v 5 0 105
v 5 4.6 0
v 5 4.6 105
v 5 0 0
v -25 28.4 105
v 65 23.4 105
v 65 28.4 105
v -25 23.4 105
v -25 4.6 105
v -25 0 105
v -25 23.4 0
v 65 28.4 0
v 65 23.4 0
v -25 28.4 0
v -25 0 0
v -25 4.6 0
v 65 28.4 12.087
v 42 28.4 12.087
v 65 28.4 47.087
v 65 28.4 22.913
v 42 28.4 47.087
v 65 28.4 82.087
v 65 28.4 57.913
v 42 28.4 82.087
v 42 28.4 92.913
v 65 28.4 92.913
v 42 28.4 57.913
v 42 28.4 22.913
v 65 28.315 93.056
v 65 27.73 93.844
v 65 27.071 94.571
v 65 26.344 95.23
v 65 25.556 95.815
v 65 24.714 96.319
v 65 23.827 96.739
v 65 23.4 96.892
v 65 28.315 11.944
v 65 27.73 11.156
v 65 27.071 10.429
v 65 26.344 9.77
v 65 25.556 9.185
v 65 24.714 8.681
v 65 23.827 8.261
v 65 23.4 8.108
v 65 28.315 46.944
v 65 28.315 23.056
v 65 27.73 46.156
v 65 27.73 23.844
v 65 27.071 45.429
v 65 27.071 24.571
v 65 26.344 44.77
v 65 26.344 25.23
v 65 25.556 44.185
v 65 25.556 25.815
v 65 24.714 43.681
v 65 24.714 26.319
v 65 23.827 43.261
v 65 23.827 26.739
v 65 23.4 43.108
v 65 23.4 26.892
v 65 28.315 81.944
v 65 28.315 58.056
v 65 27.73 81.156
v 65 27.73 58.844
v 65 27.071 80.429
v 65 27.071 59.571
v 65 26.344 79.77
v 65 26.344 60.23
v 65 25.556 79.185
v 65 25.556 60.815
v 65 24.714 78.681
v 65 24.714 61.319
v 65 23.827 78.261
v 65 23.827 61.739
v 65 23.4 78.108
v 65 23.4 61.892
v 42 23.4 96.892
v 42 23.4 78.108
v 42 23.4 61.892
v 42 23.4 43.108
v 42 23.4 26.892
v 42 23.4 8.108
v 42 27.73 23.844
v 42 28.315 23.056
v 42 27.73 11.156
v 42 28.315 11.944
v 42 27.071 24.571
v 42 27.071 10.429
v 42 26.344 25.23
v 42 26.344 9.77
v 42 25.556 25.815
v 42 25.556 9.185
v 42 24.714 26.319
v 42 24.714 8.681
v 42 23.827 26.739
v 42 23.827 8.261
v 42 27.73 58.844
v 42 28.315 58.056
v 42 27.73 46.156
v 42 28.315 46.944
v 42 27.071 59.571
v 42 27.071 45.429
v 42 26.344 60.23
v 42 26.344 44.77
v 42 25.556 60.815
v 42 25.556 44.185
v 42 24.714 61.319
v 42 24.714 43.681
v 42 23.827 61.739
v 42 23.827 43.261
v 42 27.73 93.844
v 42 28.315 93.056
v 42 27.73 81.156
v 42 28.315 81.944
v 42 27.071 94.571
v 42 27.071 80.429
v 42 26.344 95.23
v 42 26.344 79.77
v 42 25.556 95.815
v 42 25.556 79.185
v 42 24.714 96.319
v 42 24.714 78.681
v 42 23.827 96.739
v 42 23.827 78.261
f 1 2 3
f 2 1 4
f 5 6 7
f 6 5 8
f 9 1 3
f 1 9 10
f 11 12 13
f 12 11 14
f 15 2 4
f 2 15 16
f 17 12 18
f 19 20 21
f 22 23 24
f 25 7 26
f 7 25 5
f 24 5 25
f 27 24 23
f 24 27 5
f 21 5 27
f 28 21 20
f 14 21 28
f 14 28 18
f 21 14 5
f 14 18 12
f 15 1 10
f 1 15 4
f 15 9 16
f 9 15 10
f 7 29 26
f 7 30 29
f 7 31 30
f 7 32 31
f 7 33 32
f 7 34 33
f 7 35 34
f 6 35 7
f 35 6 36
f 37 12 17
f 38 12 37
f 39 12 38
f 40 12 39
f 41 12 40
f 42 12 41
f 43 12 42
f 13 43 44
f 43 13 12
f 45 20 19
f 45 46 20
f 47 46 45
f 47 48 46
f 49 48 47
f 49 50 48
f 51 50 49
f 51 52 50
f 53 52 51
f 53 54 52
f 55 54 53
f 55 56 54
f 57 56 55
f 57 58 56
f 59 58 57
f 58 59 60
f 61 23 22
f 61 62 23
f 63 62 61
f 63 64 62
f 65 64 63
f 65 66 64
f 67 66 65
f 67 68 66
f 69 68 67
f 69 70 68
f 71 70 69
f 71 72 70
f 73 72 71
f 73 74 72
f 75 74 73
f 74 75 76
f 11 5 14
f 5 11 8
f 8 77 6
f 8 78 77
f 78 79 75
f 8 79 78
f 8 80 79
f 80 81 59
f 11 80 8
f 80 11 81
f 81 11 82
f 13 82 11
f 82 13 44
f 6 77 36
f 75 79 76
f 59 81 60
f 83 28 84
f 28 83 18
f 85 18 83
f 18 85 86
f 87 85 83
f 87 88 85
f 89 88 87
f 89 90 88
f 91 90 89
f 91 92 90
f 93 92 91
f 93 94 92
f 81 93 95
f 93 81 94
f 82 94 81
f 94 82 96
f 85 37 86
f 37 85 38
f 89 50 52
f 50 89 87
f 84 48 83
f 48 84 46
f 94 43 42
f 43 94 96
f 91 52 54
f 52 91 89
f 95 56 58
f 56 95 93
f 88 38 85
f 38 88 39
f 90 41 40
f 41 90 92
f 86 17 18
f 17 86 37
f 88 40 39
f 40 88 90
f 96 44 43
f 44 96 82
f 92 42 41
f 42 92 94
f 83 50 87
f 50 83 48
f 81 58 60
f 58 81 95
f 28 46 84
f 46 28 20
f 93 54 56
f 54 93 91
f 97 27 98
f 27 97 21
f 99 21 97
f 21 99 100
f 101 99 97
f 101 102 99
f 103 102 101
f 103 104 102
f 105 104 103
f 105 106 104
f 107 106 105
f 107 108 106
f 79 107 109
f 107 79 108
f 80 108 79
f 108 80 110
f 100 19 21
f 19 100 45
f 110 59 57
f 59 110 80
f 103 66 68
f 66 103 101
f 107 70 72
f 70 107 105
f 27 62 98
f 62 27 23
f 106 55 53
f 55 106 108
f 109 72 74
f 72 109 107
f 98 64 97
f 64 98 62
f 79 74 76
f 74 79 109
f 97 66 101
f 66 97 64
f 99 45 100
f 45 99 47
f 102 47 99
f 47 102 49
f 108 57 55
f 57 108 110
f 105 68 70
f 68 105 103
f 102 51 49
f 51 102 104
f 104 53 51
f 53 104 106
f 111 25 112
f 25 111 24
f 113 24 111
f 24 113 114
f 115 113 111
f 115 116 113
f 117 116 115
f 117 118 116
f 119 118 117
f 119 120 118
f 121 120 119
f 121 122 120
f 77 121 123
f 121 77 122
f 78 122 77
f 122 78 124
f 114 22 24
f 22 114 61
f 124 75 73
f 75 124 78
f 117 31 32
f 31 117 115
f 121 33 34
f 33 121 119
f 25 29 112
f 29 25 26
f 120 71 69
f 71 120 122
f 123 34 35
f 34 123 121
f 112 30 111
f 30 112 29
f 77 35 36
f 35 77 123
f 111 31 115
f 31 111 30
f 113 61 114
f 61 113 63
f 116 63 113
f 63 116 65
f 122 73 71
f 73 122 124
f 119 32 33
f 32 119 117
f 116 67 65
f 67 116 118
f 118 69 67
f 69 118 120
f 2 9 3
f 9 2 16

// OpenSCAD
// Pipette Holder Clamp
// Designed for an 18mm thick shelf.
// Printed lying on its side (Z is the extrusion direction).

// Dimensions
shelf_thickness = 18.0;
spine_x_end     = 5.0;
spine_y_end     = 28.4;
bottom_jaw_x_end = 5.0;
bottom_jaw_y_end = 5.0;
bottom_jaw_x_start = -25.0;

arm_x_end       = 65.0;
arm_y_start      = 23.4;
arm_y_end        = 28.4;
arm_x_start      = -25.0;

gap_clearance    = 0.4; // Extra clearance for the 18mm shelf
extrusion_length = 105.0;

// Hole dimensions
hole_diameter    = 20.0;
hole_spacing     = 35.0; // 52.5 - 17.5 = 35
hole_z_start      = 17.5;
hole_z_end        = 87.5;

// Hole X/Y positioning (relative to the profile)
// User specified: centered at x = 42 and z = 17.5, 52.5, 87.5.
// Since we are printing on side, the "Z" in the prompt refers to the extrusion axis.
// The "Y" in the prompt refers to the vertical axis in use.
// In the print orientation (XY plane profile, Z extrusion):
// Profile X = Profile X
// Profile Y = Profile Y
// Profile Z = Extrusion direction
// The holes are "through the arm along Y (vertically in use)".
// This means the hole axis is the Y axis of the profile.

$fn = 64;

module profile() {
    difference() {
        // Main Body
        union() {
            // Spine
            translate([0, 0, 0])
                cube([spine_x_end, spine_y_end, extrusion_length]);
            
            // Bottom Jaw
            translate([bottom_jaw_x_start, 0, 0])
                cube([bottom_jaw_x_end - bottom_jaw_x_start, bottom_jaw_y_end, extrusion_length]);
            
            // Top Jaw and Arm
            translate([arm_x_start, arm_y_start, 0])
                cube([arm_x_end - arm_x_start, arm_y_end - arm_y_start, extrusion_length]);
        }

        // Shelf Gap (to ensure it fits 18mm)
        // The gap is between y=5 and y=23.4 (18.4mm). 
        // We subtract a slightly larger volume to ensure no interference.
        translate([-30, 5 - gap_clearance, -1])
            cube([100, shelf_thickness + (gap_clearance * 2), extrusion_length + 2]);

        // Pipette Holes
        // Holes are through the arm along Y (vertically in use).
        // In print orientation, the arm is at Y = [23.4, 28.4].
        // The hole axis is Y.
        for (z_pos = [hole_z_start, hole_z_start + hole_spacing, hole_z_start + 2 * hole_spacing]) {
            translate([42, 20, z_pos]) // Centered at x=42, and roughly in the middle of the arm's Y thickness
                rotate([0, 90, 0])
                cylinder(h = 100, d = hole_diameter);
        }
    }
}

// Render the part
// The profile is built in the XY plane and extruded along Z.
profile();
